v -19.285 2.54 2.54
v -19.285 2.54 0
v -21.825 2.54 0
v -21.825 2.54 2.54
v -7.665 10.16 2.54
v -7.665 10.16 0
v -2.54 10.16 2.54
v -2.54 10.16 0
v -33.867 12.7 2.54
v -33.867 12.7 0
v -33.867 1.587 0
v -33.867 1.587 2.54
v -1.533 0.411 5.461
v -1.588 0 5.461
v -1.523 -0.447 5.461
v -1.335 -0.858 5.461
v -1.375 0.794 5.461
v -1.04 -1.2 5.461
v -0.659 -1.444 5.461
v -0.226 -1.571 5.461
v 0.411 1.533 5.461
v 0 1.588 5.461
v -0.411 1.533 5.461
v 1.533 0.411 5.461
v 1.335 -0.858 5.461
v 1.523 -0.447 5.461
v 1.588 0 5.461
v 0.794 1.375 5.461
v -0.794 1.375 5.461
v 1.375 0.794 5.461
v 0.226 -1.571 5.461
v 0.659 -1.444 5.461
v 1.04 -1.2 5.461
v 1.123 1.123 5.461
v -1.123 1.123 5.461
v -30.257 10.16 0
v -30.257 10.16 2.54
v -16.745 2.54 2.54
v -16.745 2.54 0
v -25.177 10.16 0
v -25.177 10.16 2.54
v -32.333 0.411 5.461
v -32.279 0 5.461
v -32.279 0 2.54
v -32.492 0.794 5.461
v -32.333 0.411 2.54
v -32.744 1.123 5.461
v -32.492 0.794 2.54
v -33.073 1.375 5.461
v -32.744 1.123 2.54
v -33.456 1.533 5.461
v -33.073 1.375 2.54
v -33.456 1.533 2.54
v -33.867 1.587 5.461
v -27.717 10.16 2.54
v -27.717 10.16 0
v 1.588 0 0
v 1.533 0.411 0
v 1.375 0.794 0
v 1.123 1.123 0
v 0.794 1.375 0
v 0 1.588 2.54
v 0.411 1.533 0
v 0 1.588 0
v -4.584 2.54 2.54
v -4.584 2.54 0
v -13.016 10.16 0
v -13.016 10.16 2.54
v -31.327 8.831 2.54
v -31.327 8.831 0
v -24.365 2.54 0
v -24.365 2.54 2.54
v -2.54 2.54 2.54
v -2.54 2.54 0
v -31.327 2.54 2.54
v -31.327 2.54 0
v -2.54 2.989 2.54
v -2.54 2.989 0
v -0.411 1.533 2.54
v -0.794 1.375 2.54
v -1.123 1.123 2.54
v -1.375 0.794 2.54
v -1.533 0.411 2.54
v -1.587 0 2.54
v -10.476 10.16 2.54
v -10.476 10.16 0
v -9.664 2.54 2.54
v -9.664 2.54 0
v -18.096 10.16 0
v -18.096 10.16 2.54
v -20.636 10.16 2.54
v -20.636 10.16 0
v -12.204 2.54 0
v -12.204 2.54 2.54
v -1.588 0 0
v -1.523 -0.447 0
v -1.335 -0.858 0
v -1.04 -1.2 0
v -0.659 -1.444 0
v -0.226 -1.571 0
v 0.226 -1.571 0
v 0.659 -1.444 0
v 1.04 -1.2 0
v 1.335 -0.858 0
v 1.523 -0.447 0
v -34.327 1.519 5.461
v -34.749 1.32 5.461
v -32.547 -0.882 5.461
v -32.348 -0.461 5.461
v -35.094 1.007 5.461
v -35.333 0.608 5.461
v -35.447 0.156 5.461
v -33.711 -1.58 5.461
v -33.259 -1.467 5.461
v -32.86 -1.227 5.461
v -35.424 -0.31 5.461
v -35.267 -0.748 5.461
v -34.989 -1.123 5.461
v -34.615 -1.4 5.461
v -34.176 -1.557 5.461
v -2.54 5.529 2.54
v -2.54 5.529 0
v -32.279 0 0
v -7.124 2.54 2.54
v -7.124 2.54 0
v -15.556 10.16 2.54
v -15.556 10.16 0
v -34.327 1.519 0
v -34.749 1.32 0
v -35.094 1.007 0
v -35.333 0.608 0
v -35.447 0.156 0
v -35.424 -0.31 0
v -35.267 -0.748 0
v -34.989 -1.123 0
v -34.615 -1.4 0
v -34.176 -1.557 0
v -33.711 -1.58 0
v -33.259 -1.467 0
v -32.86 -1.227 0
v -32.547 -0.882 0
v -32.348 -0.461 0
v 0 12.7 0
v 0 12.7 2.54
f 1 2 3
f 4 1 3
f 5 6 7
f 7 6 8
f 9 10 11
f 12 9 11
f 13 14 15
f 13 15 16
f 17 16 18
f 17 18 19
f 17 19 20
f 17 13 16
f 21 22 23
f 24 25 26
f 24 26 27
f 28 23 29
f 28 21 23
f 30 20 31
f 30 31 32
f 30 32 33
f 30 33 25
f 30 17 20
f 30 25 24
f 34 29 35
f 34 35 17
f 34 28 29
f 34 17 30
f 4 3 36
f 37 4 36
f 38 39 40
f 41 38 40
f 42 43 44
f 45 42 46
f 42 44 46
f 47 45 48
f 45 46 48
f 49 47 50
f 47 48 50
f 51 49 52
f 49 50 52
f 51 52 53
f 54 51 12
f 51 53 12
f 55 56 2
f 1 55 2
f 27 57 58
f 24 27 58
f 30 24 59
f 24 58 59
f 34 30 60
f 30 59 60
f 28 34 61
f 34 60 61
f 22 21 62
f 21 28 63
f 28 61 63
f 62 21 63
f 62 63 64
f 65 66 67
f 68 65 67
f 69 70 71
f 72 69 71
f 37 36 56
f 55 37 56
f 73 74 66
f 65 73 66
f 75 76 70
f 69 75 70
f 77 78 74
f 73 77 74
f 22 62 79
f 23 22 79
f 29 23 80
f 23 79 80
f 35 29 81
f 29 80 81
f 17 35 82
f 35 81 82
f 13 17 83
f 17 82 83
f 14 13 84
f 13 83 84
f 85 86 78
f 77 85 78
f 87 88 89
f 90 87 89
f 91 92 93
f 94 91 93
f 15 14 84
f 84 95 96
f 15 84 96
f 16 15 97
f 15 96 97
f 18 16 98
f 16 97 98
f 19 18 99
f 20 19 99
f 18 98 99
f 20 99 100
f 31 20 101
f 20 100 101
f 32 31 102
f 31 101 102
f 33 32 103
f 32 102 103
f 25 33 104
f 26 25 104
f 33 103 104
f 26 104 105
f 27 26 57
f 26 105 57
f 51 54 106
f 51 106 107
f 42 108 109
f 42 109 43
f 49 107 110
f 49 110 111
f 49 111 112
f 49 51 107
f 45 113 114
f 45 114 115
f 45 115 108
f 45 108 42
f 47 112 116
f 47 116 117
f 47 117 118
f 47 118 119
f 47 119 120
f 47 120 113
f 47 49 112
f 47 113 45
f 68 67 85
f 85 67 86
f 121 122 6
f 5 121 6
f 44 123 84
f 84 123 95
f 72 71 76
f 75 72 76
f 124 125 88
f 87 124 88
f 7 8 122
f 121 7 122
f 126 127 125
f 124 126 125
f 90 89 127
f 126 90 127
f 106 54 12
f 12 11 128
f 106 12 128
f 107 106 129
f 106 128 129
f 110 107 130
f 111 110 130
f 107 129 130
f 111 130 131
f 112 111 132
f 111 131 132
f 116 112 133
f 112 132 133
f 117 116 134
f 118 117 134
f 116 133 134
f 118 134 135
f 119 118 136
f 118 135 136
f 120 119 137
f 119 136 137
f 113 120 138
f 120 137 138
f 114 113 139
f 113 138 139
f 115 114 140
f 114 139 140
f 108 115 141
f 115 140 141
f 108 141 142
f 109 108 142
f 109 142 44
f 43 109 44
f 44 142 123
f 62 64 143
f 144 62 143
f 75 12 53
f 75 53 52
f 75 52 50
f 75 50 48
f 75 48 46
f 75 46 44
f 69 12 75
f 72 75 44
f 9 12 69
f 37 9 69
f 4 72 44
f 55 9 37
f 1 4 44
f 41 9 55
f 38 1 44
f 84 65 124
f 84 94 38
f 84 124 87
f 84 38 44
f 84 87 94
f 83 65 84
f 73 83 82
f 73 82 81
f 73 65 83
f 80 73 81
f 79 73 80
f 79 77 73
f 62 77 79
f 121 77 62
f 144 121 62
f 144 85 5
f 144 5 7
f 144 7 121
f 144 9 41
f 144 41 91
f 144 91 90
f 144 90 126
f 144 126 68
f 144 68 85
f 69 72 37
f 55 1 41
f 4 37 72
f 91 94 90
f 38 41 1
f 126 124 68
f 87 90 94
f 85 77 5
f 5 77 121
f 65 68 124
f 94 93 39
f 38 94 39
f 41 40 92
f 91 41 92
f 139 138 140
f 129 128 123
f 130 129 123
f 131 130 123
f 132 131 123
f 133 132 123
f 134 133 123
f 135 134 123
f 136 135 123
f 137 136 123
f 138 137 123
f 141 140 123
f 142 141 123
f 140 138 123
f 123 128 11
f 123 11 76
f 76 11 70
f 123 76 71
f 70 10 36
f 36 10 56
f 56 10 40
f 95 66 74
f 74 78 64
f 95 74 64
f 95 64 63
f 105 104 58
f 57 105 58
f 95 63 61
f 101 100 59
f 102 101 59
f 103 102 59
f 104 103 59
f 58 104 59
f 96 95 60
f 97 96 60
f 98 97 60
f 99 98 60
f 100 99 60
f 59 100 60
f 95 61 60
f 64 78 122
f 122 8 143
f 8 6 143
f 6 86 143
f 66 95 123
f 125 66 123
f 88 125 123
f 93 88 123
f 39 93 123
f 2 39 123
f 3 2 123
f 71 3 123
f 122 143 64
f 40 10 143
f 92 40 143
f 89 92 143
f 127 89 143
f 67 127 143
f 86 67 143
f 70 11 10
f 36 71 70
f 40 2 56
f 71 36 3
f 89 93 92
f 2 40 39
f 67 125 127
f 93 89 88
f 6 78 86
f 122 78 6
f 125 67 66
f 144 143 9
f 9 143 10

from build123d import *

# Parameters (mm, degrees)
F1_DEPTH = 2.54
F2_DEPTH = 5.461


with BuildPart() as f1:
    # F0 (on Top) → F1 (new body)
    with BuildSketch(Plane.XY):
        with BuildLine():
            Line((0, 0), (0, 1.5875))
            ThreePointArc((0, 1.5875), (-1.122532, 1.122532), (-1.5875, 0))
            Line((-1.5875, 0), (0, 0))
        make_face()
        with BuildLine():
            ThreePointArc((-32.279158, 0), (-32.744126, 1.122532), (-33.866658, 1.5875))
            Line((-33.866658, 1.5875), (-33.866658, 0))
            Line((-33.866658, 0), (-32.279158, 0))
        make_face()
        with BuildLine():
            ThreePointArc((-1.5875, 0), (-1.122532, 1.122532), (0, 1.5875))
            Line((0, 1.5875), (0, 12.7))
            Line((0, 12.7), (-33.866658, 12.7))
            Line((-33.866658, 12.7), (-33.866658, 9.68375))
            Line((-33.866658, 9.68375), (-33.866658, 7.14375))
            Line((-33.866658, 7.14375), (-33.866658, 1.5875))
            ThreePointArc((-33.866658, 1.5875), (-32.744126, 1.122532), (-32.279158, 0))
            Line((-32.279158, 0), (-25.961585, 0))
            Line((-25.961585, 0), (-23.421585, 0))
            Line((-23.421585, 0), (-16.473984, 0))
            Line((-16.473984, 0), (-13.933984, 0))
            Line((-13.933984, 0), (-1.5875, 0))
        make_face()
        Polygon((-30.256754, 10.16), (-27.716754, 10.16), (-25.176754, 10.16), (-20.635653, 10.16), (-18.095653, 10.16), (-15.555653, 10.16), (-13.015653, 10.16), (-10.475653, 10.16), (-7.664961, 10.16), (-2.54, 10.16), (-2.54, 5.528615), (-2.54, 2.988615), (-2.54, 2.54), (-4.583576, 2.54), (-7.123576, 2.54), (-9.663576, 2.54), (-12.203576, 2.54), (-16.744676, 2.54), (-19.284676, 2.54), (-21.824676, 2.54), (-24.364676, 2.54), (-31.326658, 2.54), (-31.326658, 8.831487), (-31.326658, 10.16), align=None, mode=Mode.SUBTRACT)
        Polygon((-25.176754, 10.16), (-27.716754, 10.16), (-19.284676, 2.54), (-16.744676, 2.54), align=None)
        Polygon((-21.824676, 2.54), (-30.256754, 10.16), (-31.326658, 10.16), (-31.326658, 8.831487), (-24.364676, 2.54), align=None)
        Polygon((-18.095653, 10.16), (-20.635653, 10.16), (-12.203576, 2.54), (-9.663576, 2.54), align=None)
        Polygon((-13.015653, 10.16), (-15.555653, 10.16), (-7.123576, 2.54), (-4.583576, 2.54), align=None)
        Polygon((-7.664961, 10.16), (-10.475653, 10.16), (-2.54, 2.988615), (-2.54, 5.528615), align=None)
    extrude(amount=F1_DEPTH)

    # F0 (on Top) → F2 (join)
    with BuildSketch(Plane.XY):
        with BuildLine():
            Line((-33.866658, 0), (-33.866658, 1.5875))
            ThreePointArc((-33.866658, 1.5875), (-34.98919, -1.122532), (-32.279158, 0))
            Line((-32.279158, 0), (-33.866658, 0))
        make_face()
        with BuildLine():
            ThreePointArc((1.5875, 0), (1.122532, 1.122532), (0, 1.5875))
            Line((0, 1.5875), (0, 0))
            Line((0, 0), (-1.5875, 0))
            ThreePointArc((-1.5875, 0), (0, -1.5875), (1.5875, 0))
        make_face()
        with BuildLine():
            ThreePointArc((-32.279158, 0), (-32.744126, 1.122532), (-33.866658, 1.5875))
            Line((-33.866658, 1.5875), (-33.866658, 0))
            Line((-33.866658, 0), (-32.279158, 0))
        make_face()
        with BuildLine():
            Line((0, 0), (0, 1.5875))
            ThreePointArc((0, 1.5875), (-1.122532, 1.122532), (-1.5875, 0))
            Line((-1.5875, 0), (0, 0))
        make_face()
    extrude(amount=F2_DEPTH)


solid = f1.part
